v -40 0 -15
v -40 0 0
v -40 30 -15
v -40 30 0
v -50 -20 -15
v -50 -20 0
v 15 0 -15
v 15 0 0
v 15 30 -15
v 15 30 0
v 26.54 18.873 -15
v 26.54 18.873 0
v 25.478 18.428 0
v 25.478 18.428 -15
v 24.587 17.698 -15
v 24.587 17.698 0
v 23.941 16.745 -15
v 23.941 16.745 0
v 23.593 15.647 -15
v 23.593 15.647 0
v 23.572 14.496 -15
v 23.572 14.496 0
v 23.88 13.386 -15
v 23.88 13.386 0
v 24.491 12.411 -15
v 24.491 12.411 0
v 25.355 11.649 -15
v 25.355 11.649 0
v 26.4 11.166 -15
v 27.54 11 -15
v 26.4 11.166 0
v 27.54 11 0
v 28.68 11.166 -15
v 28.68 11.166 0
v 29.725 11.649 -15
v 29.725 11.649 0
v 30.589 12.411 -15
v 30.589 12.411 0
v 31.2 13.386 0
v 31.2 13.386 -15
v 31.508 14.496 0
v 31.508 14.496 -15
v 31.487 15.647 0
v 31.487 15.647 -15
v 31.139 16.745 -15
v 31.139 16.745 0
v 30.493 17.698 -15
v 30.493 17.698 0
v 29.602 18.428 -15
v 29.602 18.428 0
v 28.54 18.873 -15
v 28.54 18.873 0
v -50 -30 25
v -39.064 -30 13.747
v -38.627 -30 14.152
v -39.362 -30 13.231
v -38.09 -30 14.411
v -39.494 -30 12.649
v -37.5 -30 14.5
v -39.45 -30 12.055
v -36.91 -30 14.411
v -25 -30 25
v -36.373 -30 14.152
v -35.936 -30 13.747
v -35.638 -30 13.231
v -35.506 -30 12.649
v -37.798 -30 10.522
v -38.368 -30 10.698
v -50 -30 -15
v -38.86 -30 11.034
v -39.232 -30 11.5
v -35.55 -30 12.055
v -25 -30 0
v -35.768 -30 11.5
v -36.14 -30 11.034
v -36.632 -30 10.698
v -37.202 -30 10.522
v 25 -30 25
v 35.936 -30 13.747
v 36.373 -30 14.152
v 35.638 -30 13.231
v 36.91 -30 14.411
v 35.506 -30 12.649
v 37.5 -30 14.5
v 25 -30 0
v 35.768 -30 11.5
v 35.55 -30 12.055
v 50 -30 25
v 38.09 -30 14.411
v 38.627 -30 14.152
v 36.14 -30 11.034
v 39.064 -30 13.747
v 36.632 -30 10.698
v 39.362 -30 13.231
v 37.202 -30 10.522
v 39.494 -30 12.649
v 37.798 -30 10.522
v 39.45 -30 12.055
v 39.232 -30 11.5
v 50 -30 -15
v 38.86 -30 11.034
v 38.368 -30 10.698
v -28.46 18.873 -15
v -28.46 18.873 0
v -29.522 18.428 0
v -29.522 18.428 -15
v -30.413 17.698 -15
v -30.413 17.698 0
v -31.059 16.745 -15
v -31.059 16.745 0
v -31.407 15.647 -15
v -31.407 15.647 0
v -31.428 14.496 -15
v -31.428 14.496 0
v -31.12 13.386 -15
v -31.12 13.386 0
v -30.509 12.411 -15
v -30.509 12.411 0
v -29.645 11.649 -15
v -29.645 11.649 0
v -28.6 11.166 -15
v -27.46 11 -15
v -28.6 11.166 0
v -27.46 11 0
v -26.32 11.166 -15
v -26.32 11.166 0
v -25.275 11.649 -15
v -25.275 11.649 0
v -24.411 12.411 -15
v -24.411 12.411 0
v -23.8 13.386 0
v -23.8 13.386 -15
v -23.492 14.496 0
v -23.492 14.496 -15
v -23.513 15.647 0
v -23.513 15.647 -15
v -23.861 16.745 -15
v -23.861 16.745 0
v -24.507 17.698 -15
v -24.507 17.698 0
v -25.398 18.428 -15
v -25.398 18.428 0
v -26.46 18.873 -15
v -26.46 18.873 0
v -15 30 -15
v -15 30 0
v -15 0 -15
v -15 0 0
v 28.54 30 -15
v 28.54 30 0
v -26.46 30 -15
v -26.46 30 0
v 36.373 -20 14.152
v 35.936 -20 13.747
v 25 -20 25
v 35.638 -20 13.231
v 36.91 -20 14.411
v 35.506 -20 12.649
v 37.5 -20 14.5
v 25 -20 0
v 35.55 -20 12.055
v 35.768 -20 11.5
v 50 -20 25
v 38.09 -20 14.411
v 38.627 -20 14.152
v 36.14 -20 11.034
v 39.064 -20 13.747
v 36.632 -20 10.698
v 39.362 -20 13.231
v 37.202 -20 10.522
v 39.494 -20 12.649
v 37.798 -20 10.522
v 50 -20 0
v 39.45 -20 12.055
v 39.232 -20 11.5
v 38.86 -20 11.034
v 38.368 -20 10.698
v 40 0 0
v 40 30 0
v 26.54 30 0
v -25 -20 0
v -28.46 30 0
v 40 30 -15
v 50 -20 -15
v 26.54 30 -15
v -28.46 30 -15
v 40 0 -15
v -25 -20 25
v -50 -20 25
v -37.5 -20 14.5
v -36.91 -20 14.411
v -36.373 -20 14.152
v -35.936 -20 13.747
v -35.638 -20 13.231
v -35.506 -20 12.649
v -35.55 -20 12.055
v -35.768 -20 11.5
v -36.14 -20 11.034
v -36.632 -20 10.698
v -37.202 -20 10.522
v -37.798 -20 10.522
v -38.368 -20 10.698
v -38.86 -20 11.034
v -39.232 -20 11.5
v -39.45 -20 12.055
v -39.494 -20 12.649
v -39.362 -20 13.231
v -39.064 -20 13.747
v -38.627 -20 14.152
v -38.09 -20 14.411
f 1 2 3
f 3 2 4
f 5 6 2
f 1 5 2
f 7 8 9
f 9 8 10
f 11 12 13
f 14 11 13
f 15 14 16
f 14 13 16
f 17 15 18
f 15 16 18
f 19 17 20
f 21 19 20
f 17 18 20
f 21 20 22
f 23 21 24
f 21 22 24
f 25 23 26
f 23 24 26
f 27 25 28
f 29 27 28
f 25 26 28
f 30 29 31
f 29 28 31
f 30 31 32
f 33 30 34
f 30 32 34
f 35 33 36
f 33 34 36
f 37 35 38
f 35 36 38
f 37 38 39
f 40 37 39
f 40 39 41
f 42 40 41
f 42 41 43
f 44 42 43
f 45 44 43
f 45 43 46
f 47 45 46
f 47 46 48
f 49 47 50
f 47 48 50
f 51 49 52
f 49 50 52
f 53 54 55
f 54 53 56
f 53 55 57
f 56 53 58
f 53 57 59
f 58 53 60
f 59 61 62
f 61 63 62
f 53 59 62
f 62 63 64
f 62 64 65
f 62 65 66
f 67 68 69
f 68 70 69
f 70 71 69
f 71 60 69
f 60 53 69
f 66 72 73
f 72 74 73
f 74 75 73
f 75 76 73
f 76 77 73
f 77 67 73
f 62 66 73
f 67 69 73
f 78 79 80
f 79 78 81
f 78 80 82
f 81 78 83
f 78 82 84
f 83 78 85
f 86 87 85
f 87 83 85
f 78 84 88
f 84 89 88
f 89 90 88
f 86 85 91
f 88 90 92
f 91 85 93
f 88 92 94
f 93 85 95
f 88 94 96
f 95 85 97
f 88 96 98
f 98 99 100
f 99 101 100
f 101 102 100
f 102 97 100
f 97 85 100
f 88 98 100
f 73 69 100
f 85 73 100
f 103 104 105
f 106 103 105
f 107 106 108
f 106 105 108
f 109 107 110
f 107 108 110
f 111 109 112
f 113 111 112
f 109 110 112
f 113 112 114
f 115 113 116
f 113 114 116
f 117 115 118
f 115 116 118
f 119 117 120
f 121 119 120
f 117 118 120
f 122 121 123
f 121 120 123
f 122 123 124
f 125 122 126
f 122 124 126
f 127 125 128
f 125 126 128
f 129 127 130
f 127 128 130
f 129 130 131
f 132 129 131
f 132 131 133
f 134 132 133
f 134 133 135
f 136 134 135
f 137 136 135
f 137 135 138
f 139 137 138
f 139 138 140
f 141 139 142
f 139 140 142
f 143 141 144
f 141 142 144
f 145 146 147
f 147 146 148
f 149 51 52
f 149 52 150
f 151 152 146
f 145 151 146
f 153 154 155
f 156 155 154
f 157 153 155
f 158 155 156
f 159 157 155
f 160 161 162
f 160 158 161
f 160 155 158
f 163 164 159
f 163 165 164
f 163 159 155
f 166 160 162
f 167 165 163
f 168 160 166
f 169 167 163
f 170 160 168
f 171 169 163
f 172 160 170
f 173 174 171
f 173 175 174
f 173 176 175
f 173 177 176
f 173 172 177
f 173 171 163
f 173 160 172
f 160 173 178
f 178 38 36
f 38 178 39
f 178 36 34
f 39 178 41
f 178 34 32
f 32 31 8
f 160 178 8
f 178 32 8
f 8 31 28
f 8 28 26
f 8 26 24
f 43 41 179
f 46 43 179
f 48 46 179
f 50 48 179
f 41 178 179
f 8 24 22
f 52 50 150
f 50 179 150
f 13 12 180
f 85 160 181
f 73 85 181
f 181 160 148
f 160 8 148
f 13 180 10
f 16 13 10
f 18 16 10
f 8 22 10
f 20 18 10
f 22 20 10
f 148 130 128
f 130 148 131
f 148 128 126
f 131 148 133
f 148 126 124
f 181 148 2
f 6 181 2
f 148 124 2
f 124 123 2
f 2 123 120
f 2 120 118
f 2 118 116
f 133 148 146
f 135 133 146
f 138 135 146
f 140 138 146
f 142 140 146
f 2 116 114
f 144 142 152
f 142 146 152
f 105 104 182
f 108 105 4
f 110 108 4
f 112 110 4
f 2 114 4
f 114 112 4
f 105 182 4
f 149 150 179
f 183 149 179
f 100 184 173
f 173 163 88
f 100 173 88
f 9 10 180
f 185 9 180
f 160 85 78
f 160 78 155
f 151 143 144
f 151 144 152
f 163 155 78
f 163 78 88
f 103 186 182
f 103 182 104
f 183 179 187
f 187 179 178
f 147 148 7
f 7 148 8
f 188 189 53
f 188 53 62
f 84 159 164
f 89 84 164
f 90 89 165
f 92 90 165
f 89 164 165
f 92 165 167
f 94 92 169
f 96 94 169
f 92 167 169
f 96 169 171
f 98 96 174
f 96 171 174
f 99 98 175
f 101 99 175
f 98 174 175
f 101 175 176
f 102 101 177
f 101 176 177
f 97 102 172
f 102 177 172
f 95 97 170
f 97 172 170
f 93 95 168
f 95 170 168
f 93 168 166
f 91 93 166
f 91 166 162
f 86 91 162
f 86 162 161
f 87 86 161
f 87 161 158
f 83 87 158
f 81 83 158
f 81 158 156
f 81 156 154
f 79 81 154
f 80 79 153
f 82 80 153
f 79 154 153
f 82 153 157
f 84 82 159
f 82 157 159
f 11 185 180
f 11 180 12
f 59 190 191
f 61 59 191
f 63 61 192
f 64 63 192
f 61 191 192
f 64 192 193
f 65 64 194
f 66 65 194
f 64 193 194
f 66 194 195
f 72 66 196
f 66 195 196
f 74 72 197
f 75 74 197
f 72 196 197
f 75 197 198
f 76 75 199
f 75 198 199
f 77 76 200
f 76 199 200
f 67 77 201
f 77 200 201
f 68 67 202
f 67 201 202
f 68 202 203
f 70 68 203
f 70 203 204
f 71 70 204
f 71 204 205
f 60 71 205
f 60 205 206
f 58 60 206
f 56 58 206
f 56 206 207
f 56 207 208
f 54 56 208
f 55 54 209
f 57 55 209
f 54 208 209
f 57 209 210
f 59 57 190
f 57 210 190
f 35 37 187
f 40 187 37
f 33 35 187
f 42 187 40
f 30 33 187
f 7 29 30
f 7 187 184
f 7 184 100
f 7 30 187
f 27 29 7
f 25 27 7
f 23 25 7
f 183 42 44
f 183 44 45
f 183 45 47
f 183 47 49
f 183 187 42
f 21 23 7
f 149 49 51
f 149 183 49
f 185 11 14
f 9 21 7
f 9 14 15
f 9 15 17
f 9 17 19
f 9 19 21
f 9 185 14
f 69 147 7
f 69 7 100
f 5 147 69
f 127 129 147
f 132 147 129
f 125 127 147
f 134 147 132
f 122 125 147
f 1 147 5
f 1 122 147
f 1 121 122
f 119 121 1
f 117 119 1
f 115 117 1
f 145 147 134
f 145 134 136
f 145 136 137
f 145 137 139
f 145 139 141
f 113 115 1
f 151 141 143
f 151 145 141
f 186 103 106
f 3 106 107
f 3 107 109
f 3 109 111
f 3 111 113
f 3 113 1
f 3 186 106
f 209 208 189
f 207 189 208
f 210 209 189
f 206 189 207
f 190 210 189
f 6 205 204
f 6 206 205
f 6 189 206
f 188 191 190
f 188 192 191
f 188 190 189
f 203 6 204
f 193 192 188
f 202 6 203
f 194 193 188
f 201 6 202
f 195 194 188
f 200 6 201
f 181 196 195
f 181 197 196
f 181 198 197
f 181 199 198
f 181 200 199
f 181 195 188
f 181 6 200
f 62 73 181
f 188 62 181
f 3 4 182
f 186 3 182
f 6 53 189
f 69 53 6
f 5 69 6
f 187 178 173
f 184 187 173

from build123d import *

# Parameters (mm, degrees)
BOSS_EXTRUDE1_DEPTH = 15
SKETCH2_W           = 25
SKETCH2_H           = 10
BOSS_EXTRUDE2_DEPTH = 25
SKETCH3_R           = 2
CUT_EXTRUDE1_DEPTH  = 10


with BuildPart() as part:
    # Sketch1 → Boss-Extrude1 (new body)
    with BuildSketch(Plane.XY):
        with BuildLine():
            Line((-15, 0), (0, 0))
            Line((0, 0), (15, 0))
            Line((15, 0), (15, 30))
            Line((15, 30), (26.540029545, 30))
            Line((26.540029545, 30), (26.540029545, 18.872983346))
            ThreePointArc((26.540029545, 18.872983346), (27.540029545, 11), (28.540029545, 18.872983346))
            Line((28.540029545, 18.872983346), (28.540029545, 30))
            Line((28.540029545, 30), (40, 30))
            Line((40, 30), (40, 0))
            Line((40, 0), (50, -20))
            Line((50, -20), (50, -30))
            Line((50, -30), (0, -30))
            Line((0, -30), (-50, -30))
            Line((-50, -30), (-50, -20))
            Line((-50, -20), (-40, 0))
            Line((-40, 0), (-40, 30))
            Line((-40, 30), (-28.459970455, 30))
            Line((-28.459970455, 30), (-28.459970455, 18.872983346))
            ThreePointArc((-28.459970455, 18.872983346), (-27.459970455, 11), (-26.459970455, 18.872983346))
            Line((-26.459970455, 18.872983346), (-26.459970455, 30))
            Line((-26.459970455, 30), (-15, 30))
            Line((-15, 30), (-15, 0))
        make_face()
    extrude(amount=-BOSS_EXTRUDE1_DEPTH)

    # Sketch2 → Boss-Extrude2 (add)
    with BuildSketch(Plane.XY):
        with Locations((-37.5, -25)):
            Rectangle(SKETCH2_W, SKETCH2_H)
        with Locations((37.5, -25)):
            Rectangle(SKETCH2_W, SKETCH2_H)
    extrude(amount=BOSS_EXTRUDE2_DEPTH)

    # Sketch3 → Cut-Extrude1 (cut)
    with BuildSketch(Plane(origin=(0, -20, 0), x_dir=(1, 0, 0), z_dir=(0, 1, 0))):
        with Locations(Location((-37.5, -12.5, 0), (0, 0, 270))):
            Circle(SKETCH3_R)
        with Locations(Location((37.5, -12.5, 0), (0, 0, 270))):
            Circle(SKETCH3_R)
    extrude(amount=-CUT_EXTRUDE1_DEPTH, mode=Mode.SUBTRACT)


solid = part.part
